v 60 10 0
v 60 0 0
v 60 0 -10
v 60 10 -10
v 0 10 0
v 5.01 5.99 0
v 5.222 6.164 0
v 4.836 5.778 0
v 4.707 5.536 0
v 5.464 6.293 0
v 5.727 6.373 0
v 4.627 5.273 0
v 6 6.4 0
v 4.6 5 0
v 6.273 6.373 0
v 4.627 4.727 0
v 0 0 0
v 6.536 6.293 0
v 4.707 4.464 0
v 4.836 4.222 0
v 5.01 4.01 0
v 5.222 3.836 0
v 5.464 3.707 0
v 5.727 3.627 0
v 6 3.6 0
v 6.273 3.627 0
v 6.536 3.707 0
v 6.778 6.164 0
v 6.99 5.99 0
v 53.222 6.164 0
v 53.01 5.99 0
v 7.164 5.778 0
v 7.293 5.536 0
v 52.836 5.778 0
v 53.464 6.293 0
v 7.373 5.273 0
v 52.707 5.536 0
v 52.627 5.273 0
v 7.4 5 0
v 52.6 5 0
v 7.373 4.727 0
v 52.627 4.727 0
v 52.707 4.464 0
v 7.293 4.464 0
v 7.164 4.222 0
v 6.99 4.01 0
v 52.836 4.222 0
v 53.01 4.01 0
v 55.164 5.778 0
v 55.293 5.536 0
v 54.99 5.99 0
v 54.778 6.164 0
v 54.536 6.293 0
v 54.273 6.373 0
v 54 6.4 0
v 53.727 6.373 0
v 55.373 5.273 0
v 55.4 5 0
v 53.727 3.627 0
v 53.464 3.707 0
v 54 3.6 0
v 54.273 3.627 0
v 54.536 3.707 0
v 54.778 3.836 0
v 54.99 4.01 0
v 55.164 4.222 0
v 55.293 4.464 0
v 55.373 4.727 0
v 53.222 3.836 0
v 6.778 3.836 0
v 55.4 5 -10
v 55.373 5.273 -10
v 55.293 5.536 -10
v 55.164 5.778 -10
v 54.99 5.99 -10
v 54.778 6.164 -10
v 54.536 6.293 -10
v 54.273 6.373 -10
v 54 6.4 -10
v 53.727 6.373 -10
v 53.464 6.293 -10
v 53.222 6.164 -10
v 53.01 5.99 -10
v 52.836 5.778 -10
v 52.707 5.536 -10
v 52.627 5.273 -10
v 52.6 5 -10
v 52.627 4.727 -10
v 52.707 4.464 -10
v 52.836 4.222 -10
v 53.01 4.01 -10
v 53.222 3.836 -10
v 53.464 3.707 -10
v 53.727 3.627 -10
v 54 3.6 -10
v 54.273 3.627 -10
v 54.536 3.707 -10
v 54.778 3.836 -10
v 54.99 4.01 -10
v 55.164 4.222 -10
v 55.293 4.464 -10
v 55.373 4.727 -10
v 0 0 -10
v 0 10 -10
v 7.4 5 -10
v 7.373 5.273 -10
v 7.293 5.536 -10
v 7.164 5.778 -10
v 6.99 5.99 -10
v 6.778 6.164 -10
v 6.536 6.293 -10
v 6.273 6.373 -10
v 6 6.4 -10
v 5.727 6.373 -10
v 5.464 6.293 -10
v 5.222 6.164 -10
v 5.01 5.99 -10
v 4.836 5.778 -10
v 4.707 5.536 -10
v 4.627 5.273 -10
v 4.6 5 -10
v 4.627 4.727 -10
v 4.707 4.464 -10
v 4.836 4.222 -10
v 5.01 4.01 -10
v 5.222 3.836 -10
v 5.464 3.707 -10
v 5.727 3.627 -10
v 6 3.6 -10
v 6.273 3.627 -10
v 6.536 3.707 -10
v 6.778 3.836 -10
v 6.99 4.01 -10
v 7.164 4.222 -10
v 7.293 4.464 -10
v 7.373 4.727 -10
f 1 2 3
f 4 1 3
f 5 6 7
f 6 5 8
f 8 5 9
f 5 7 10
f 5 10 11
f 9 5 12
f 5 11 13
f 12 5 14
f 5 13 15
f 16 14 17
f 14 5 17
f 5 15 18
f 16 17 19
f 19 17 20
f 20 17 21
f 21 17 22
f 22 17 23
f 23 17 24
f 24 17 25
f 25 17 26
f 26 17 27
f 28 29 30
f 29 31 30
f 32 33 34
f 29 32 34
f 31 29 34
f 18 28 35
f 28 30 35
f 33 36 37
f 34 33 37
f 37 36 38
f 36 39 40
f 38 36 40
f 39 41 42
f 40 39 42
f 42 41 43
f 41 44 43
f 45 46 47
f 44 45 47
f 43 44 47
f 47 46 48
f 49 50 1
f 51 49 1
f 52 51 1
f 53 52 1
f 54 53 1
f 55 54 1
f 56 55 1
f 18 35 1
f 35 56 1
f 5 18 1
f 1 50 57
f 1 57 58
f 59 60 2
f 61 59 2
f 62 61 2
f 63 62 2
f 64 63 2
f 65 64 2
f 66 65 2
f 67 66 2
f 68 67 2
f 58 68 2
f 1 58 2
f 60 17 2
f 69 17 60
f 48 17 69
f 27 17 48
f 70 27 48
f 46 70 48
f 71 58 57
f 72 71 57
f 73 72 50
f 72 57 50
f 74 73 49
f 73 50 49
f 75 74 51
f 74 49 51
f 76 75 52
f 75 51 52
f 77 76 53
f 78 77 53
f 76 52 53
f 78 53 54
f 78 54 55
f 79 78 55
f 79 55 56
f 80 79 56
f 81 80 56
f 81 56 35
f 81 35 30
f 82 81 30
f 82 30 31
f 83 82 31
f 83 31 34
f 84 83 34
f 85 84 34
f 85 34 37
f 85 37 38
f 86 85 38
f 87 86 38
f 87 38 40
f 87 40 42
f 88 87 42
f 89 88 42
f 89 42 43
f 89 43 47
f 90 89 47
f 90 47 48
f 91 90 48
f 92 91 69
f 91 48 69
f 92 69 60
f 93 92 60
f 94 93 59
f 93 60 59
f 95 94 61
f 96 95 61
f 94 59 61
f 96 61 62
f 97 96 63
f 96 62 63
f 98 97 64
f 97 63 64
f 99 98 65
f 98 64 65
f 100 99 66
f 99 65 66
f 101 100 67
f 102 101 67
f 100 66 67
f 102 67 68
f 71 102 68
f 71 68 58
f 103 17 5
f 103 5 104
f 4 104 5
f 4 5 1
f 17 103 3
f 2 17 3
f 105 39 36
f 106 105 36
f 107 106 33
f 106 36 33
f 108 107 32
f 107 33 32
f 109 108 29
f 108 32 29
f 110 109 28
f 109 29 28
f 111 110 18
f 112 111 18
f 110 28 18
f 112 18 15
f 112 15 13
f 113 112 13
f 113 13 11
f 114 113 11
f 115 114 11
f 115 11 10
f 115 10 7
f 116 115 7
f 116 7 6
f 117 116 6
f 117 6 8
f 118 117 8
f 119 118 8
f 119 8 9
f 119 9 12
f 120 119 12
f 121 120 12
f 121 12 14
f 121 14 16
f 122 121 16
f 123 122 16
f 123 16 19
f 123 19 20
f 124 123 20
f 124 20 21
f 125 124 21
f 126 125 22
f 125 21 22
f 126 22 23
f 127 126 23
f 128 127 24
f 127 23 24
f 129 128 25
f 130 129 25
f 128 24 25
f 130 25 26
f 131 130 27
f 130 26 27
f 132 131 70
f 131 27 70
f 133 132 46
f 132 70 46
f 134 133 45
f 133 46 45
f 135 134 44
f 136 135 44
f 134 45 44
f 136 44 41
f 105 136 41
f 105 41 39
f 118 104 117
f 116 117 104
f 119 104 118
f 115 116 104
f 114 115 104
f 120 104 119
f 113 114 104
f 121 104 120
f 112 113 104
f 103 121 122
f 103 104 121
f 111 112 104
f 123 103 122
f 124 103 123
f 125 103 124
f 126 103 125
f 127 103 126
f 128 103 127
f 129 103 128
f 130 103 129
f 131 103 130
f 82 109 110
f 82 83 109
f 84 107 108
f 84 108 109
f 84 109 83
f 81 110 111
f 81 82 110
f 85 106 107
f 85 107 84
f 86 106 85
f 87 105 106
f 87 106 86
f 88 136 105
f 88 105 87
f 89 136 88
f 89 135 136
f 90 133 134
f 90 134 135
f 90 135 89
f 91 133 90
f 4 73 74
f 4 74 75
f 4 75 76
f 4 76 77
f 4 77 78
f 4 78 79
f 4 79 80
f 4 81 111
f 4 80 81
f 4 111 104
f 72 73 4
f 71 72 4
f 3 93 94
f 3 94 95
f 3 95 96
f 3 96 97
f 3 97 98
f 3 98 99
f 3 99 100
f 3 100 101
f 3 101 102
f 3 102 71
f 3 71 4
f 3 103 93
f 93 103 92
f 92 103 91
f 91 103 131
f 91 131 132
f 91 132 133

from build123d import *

# Parameters (mm, degrees)
SKETCH_1_W          = 60
SKETCH_1_H          = 10
EXTRUDE_1_DEPTH     = 10
SKETCH_3_R          = 1.4
CUT_EXTRUDE_1_DEPTH = 20


with BuildPart() as part:
    # 草图1 → 凸台-拉伸1 (new body)
    with BuildSketch(Plane(origin=(0, 0, 0), x_dir=(1, 0, 0), z_dir=(0, 1, 0))):
        with Locations((30, 5)):
            Rectangle(SKETCH_1_W, SKETCH_1_H)
    extrude(amount=EXTRUDE_1_DEPTH)

    # 草图3 → 切除-拉伸1 (cut)
    with BuildSketch(Plane.XY):
        with Locations((6, 5)):
            Circle(SKETCH_3_R)
        with Locations((54, 5)):
            Circle(SKETCH_3_R)
    extrude(amount=-CUT_EXTRUDE_1_DEPTH, mode=Mode.SUBTRACT)


solid = part.part
